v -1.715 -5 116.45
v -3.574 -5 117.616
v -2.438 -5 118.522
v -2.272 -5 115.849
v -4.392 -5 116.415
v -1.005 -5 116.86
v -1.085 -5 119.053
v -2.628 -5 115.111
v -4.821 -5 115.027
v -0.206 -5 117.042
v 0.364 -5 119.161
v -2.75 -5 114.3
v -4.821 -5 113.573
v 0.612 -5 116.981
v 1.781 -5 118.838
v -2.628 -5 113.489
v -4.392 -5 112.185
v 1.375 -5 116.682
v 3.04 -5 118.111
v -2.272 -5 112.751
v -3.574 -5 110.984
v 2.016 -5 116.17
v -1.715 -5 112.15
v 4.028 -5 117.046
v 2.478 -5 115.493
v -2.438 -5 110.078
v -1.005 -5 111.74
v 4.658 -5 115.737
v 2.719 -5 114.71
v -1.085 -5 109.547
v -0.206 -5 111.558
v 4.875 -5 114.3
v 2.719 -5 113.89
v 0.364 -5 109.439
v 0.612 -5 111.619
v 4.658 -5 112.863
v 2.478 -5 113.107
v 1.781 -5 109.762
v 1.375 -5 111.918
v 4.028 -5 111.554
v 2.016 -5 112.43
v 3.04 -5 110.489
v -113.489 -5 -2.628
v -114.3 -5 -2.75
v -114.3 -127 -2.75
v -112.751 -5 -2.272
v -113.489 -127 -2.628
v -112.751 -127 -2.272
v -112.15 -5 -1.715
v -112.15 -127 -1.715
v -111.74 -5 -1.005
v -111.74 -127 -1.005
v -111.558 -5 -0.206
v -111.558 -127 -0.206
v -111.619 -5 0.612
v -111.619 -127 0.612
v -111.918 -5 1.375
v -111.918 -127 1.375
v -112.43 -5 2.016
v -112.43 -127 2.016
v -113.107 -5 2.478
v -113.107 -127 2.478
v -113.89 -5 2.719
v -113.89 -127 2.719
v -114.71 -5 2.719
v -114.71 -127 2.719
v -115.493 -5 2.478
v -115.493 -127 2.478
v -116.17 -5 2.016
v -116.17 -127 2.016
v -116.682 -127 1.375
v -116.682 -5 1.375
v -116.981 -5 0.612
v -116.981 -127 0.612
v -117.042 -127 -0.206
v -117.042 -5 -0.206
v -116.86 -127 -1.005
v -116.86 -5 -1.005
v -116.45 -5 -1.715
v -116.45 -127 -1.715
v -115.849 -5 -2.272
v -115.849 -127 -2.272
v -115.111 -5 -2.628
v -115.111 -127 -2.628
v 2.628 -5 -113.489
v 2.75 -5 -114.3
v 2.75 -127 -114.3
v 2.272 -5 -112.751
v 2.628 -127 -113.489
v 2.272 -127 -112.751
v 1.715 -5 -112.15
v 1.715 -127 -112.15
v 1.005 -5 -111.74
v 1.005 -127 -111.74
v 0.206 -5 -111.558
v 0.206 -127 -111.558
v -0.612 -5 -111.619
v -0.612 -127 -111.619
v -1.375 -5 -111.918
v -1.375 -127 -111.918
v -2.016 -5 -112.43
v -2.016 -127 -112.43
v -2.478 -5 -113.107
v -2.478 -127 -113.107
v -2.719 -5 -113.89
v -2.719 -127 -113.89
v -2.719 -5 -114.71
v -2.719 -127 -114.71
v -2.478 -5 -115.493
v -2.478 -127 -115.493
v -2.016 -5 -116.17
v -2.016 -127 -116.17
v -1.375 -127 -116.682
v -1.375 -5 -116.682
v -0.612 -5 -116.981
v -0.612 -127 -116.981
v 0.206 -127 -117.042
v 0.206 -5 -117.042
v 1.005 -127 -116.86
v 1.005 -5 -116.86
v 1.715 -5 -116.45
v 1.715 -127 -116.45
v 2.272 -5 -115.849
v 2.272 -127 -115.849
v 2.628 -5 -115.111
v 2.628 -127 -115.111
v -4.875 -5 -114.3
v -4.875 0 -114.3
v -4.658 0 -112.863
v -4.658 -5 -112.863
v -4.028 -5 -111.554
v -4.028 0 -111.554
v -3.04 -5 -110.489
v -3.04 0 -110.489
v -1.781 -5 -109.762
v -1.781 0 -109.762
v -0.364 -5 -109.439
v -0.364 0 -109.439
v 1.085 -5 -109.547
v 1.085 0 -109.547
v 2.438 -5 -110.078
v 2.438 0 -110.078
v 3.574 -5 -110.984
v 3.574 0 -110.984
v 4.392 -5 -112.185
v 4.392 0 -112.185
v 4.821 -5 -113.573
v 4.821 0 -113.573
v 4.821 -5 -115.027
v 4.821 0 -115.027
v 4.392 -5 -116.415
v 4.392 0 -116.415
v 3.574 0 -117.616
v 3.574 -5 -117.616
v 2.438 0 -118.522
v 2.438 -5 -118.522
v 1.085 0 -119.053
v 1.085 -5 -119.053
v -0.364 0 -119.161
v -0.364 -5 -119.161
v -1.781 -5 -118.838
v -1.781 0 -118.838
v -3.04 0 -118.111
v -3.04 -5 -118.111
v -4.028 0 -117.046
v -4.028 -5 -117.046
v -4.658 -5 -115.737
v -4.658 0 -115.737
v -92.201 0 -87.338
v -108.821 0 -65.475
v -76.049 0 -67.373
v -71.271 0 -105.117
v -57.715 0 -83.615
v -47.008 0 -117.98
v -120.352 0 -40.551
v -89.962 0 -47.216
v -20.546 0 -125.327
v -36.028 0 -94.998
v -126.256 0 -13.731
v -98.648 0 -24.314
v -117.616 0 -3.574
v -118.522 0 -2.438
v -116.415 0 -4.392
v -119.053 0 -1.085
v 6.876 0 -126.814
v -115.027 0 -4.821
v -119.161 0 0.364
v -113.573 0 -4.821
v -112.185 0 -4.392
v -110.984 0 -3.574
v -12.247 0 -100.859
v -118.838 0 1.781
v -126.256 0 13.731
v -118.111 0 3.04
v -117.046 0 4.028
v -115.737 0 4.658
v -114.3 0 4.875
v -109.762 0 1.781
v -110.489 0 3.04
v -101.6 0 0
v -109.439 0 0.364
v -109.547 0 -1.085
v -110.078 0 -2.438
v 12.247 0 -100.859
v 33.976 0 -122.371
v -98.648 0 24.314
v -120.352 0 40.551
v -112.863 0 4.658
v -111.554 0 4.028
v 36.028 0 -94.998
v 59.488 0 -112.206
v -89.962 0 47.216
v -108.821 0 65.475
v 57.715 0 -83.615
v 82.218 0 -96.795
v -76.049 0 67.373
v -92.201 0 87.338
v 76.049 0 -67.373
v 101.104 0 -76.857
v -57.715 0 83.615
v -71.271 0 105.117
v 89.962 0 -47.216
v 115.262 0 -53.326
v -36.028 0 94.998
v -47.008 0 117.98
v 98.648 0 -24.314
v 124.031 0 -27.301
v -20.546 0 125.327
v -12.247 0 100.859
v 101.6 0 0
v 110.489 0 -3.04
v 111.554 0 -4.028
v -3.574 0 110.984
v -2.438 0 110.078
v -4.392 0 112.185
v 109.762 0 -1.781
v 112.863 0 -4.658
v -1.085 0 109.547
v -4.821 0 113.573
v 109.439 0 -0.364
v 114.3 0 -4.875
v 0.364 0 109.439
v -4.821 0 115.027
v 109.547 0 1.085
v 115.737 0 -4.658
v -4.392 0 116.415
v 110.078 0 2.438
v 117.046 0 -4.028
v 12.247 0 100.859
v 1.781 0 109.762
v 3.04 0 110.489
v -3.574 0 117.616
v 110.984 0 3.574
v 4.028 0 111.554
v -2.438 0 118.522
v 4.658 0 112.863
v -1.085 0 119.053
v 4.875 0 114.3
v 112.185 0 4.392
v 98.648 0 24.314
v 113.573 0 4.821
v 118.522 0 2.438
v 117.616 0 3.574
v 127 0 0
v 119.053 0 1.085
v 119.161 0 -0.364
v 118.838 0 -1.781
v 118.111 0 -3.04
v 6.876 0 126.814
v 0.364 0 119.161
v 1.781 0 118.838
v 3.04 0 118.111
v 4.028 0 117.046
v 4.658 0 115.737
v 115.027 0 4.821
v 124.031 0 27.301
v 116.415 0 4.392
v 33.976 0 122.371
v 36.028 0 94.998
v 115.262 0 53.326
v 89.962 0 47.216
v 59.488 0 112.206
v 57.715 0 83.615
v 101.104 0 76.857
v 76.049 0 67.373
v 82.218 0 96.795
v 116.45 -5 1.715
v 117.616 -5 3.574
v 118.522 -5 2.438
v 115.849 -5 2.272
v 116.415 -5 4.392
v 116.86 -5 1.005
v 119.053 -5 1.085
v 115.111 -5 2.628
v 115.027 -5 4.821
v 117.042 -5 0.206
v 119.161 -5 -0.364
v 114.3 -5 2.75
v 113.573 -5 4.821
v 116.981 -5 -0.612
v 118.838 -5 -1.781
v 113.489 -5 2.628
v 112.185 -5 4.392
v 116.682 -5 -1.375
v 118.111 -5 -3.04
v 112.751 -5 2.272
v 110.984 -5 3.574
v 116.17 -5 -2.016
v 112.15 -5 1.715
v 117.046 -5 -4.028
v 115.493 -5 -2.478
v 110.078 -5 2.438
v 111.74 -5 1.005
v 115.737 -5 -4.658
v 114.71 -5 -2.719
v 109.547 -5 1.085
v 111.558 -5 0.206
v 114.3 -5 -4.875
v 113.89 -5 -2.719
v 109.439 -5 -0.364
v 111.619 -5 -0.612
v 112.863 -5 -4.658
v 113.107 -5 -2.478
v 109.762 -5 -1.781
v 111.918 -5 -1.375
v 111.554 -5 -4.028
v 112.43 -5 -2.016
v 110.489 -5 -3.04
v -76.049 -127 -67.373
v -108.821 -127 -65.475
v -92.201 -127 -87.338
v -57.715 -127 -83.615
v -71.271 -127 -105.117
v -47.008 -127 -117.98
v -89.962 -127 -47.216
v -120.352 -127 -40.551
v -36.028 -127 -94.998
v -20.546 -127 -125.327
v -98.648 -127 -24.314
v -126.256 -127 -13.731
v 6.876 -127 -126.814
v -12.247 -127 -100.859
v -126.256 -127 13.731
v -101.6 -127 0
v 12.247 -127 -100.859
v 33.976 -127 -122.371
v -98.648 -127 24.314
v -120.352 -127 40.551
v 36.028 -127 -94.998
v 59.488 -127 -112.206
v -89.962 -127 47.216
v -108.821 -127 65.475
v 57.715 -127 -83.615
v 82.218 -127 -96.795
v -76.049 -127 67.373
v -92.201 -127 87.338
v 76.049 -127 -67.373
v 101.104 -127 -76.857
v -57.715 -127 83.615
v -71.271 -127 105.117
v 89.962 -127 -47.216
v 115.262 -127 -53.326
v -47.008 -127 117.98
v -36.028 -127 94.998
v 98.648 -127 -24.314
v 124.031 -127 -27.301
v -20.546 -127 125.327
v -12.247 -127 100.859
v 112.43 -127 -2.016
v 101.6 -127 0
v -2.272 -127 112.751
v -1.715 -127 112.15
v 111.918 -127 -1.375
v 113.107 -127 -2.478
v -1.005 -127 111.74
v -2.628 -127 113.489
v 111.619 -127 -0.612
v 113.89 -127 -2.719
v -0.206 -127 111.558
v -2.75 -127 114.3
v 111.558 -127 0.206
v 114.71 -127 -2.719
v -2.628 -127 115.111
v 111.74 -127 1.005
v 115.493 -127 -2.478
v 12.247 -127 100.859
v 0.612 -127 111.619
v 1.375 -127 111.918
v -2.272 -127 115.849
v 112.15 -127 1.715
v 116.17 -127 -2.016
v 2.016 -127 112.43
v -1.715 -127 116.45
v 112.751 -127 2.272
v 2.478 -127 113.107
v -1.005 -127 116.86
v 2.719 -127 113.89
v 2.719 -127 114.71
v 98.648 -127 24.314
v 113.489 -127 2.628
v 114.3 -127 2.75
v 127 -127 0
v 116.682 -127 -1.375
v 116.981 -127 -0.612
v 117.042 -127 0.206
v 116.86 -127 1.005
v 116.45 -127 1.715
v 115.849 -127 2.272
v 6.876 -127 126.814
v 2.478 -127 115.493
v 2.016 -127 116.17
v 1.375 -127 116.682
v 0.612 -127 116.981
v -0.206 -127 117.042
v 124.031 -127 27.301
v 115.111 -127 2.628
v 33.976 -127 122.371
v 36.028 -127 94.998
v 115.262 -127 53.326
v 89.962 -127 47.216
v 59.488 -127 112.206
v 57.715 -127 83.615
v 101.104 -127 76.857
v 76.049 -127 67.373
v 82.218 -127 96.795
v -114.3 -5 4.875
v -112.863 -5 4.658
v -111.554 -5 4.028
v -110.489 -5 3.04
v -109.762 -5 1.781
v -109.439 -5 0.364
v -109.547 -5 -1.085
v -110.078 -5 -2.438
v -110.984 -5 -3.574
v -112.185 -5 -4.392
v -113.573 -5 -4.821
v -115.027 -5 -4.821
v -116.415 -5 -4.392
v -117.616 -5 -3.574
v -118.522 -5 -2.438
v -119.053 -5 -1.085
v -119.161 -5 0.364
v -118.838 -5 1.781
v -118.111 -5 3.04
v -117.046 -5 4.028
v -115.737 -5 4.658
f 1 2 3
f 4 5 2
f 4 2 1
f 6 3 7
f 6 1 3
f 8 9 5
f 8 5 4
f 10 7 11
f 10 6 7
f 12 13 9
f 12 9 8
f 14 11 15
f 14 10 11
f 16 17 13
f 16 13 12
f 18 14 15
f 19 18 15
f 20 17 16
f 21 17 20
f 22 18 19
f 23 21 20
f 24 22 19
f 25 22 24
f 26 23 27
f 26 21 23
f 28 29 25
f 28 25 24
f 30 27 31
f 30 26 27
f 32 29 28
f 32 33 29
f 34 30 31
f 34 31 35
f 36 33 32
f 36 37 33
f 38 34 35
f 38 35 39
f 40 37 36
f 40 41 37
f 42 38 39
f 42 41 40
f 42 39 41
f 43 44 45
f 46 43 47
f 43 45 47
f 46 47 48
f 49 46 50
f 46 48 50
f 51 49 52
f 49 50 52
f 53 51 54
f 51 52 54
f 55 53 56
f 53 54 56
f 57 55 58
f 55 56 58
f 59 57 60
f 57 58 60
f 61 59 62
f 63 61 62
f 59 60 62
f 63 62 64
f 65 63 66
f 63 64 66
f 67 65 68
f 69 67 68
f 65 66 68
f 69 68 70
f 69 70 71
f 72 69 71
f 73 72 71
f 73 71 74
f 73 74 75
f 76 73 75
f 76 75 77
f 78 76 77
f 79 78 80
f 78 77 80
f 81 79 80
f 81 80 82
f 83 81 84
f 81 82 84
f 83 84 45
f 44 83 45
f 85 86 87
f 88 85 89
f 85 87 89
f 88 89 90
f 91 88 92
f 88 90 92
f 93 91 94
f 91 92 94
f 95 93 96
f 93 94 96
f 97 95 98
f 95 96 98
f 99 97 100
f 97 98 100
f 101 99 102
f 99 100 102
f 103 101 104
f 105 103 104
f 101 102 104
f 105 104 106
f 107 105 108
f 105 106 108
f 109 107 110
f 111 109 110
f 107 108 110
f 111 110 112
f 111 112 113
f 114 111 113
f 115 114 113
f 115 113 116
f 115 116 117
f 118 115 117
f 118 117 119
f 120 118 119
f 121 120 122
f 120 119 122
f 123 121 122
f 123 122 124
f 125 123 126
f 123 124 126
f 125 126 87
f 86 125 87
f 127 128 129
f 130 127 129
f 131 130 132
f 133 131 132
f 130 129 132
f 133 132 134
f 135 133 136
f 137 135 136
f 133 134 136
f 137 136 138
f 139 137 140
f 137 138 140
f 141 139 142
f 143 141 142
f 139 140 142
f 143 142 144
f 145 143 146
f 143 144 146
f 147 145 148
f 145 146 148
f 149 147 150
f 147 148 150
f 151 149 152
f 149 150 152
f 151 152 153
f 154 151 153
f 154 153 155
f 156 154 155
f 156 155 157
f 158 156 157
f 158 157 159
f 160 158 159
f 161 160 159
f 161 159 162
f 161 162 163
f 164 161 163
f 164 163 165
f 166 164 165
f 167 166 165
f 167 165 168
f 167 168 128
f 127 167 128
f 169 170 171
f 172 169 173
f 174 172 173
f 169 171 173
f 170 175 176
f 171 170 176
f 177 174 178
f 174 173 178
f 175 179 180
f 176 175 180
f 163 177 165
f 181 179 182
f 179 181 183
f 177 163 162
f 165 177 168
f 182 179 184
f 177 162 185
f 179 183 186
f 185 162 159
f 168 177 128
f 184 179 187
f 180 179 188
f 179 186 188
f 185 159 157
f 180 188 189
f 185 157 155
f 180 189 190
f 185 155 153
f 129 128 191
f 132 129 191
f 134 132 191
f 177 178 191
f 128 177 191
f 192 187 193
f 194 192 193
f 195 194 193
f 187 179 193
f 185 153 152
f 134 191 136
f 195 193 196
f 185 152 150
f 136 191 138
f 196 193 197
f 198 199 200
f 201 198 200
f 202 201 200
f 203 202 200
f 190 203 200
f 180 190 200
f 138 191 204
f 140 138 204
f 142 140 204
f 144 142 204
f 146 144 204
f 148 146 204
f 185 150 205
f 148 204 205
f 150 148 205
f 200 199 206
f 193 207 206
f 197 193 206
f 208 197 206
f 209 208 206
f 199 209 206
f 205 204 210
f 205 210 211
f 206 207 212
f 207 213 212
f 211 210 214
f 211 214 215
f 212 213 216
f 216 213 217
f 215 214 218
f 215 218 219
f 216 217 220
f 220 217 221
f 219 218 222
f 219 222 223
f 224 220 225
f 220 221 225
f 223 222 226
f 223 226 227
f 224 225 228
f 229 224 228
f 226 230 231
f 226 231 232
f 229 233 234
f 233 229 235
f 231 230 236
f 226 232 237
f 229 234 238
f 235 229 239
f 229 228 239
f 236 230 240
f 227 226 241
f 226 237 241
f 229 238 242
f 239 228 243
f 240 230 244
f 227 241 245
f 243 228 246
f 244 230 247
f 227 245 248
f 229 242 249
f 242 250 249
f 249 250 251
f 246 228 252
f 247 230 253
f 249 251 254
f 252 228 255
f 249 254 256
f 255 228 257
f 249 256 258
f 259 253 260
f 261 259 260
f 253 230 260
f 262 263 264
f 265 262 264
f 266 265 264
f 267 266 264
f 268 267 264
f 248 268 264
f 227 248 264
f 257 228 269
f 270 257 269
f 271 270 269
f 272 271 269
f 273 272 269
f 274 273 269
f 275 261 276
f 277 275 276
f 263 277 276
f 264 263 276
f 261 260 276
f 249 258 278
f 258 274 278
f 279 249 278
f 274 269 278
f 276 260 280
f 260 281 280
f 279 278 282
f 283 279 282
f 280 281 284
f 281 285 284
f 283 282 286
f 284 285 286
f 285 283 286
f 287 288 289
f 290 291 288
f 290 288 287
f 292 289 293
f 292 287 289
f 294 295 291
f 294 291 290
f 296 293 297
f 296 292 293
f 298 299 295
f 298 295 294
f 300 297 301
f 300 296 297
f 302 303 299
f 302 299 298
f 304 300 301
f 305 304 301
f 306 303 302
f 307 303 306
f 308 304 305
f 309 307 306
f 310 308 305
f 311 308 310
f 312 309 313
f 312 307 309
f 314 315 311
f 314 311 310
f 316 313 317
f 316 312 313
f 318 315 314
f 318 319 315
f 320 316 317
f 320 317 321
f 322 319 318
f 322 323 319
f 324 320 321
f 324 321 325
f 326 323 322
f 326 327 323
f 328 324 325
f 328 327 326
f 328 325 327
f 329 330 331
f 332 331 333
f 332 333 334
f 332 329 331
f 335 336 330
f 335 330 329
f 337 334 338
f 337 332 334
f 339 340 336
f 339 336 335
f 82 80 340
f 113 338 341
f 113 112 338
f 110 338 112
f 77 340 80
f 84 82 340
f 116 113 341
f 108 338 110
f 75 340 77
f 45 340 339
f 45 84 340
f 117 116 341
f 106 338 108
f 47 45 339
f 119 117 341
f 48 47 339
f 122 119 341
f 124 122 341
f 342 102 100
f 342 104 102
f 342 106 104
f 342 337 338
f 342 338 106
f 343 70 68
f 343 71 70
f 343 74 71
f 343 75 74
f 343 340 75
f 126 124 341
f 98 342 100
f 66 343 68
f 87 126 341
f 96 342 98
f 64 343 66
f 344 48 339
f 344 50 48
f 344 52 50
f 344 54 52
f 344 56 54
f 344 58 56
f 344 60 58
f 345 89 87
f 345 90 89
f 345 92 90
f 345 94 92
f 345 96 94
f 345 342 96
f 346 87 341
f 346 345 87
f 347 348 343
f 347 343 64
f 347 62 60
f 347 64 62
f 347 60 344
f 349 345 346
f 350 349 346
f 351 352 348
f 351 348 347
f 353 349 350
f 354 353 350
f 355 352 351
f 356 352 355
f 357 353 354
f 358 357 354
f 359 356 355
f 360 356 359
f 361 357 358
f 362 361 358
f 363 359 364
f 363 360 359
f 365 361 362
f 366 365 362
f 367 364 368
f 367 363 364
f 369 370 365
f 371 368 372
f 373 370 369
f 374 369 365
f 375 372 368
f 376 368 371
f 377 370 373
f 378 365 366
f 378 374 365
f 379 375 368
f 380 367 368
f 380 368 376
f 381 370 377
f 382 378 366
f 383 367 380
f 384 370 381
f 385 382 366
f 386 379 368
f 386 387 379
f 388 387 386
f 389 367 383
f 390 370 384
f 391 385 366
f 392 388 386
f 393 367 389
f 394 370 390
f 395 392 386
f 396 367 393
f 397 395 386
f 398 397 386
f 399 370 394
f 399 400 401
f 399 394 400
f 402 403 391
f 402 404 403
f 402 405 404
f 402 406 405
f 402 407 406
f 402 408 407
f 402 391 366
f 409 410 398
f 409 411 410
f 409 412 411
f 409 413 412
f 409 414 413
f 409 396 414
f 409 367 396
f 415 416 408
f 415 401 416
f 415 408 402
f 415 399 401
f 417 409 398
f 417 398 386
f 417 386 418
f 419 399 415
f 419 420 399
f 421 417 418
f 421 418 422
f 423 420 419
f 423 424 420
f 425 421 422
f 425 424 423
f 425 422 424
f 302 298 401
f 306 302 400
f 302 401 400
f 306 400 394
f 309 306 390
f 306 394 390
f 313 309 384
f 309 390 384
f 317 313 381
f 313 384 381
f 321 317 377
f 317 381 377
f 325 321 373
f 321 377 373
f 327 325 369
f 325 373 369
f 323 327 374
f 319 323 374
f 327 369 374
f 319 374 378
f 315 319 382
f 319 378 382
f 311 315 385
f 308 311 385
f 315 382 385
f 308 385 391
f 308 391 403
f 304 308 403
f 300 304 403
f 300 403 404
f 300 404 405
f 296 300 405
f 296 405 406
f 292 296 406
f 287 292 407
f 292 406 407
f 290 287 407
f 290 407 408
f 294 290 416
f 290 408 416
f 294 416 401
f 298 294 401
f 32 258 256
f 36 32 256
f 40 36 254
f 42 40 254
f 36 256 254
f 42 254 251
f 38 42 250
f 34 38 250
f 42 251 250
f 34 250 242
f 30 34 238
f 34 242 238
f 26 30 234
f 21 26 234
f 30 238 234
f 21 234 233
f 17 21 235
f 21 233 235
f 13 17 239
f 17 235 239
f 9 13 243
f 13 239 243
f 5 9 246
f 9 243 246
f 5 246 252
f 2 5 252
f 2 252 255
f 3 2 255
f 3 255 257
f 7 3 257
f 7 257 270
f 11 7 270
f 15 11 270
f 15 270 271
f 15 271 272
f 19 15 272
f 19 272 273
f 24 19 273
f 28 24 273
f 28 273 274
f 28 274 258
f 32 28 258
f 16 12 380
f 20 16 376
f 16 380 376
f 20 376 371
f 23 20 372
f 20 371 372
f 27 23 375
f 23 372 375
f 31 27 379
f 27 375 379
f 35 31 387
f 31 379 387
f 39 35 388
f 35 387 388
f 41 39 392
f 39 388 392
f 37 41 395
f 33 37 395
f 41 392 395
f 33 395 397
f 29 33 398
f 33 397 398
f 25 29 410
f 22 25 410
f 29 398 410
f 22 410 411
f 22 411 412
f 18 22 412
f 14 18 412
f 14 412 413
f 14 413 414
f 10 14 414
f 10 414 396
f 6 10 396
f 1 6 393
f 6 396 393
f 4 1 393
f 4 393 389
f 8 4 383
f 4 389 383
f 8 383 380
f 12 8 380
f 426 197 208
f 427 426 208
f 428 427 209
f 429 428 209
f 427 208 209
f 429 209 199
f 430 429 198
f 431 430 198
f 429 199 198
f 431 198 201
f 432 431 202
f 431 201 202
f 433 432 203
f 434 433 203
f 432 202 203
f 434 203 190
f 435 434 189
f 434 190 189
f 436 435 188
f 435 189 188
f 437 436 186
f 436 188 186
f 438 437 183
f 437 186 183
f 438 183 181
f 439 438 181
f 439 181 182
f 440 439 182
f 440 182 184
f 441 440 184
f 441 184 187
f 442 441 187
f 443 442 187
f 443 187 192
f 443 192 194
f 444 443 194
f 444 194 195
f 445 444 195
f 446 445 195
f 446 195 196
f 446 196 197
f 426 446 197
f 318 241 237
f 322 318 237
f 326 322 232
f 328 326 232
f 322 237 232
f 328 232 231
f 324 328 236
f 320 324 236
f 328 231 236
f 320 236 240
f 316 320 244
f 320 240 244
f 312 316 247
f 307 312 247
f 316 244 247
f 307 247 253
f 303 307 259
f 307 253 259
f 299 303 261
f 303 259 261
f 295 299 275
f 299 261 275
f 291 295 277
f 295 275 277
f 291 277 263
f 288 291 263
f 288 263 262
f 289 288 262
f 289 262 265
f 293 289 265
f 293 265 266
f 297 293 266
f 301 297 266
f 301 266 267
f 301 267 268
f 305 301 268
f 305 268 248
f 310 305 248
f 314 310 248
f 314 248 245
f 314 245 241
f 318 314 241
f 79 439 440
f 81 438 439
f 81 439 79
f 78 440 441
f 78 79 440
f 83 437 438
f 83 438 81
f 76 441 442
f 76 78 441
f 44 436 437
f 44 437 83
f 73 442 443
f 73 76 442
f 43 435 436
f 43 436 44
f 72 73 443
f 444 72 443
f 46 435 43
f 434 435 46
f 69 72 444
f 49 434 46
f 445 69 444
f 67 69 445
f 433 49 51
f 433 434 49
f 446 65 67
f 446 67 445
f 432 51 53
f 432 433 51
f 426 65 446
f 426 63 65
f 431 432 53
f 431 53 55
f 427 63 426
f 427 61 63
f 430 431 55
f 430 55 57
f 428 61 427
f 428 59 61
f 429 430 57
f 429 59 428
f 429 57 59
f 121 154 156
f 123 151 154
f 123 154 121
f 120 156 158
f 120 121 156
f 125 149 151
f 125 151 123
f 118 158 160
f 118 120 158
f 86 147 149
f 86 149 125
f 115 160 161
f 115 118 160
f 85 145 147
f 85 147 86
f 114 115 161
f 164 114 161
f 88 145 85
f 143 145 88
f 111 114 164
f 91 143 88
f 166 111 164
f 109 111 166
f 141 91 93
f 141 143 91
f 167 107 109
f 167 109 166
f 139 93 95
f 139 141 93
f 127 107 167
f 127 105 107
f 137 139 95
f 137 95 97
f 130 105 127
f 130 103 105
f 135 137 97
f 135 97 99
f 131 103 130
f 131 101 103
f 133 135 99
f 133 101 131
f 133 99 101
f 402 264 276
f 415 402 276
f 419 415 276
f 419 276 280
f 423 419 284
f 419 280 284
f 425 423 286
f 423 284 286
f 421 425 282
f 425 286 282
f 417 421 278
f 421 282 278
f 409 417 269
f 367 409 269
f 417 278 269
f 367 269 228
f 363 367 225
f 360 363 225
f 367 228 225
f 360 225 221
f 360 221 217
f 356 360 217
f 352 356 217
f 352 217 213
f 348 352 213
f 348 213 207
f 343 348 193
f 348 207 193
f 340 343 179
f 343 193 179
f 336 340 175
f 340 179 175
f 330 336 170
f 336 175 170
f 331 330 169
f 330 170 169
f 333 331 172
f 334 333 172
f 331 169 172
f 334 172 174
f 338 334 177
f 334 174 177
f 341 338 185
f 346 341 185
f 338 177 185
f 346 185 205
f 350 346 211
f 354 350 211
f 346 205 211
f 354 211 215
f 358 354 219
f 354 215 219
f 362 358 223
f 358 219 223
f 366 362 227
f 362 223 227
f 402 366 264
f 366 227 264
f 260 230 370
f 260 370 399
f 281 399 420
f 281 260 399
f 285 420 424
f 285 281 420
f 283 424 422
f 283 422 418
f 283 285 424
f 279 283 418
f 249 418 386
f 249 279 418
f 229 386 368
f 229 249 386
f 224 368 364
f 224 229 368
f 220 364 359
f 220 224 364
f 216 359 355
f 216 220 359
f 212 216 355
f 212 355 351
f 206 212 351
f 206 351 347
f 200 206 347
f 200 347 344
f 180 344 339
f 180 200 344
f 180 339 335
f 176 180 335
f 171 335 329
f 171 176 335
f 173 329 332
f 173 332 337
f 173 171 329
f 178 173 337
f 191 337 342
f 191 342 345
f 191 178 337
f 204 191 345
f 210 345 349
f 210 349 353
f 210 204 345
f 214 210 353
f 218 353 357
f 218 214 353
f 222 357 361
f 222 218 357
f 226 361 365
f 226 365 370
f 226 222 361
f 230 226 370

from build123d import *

# Parameters (mm, degrees)
F0_R            = 127
F0_R_2          = 101.6
F1_DEPTH        = 127
F3_D            = 5.5
F3_CBORE_D      = 9.75
F3_CBORE_DEPTH  = 5
F3_COPIES_COUNT = 4


# Not quite as in the source:
# - a pattern or mirror of a feature is missing from the dataset's text; its kind, count and spacing are read off the source's solid


with BuildPart() as f1:
    # F0 (on Front) → F1 (new body)
    with BuildSketch(Plane.XZ):
        Circle(F0_R)
        Circle(F0_R_2, mode=Mode.SUBTRACT)
    extrude(amount=F1_DEPTH)

    # F3 (through all)
    with Locations(Plane(origin=(0, 0, 0), x_dir=(-1, 0, 0), z_dir=(0, 1, 0))):
        with Locations((0, 0), (0, -114.3)):
            f3 = CounterBoreHole(F3_D / 2, F3_CBORE_D / 2, F3_CBORE_DEPTH)

    # F3_copies: F3 ×4 about axis
    f3_copies_axis = Axis((0, 0, 0), (0, 1, 0))
    for i in range(1, F3_COPIES_COUNT):
        add(f3.rotate(f3_copies_axis, i * 360 / F3_COPIES_COUNT), mode=Mode.SUBTRACT)


solid = f1.part
